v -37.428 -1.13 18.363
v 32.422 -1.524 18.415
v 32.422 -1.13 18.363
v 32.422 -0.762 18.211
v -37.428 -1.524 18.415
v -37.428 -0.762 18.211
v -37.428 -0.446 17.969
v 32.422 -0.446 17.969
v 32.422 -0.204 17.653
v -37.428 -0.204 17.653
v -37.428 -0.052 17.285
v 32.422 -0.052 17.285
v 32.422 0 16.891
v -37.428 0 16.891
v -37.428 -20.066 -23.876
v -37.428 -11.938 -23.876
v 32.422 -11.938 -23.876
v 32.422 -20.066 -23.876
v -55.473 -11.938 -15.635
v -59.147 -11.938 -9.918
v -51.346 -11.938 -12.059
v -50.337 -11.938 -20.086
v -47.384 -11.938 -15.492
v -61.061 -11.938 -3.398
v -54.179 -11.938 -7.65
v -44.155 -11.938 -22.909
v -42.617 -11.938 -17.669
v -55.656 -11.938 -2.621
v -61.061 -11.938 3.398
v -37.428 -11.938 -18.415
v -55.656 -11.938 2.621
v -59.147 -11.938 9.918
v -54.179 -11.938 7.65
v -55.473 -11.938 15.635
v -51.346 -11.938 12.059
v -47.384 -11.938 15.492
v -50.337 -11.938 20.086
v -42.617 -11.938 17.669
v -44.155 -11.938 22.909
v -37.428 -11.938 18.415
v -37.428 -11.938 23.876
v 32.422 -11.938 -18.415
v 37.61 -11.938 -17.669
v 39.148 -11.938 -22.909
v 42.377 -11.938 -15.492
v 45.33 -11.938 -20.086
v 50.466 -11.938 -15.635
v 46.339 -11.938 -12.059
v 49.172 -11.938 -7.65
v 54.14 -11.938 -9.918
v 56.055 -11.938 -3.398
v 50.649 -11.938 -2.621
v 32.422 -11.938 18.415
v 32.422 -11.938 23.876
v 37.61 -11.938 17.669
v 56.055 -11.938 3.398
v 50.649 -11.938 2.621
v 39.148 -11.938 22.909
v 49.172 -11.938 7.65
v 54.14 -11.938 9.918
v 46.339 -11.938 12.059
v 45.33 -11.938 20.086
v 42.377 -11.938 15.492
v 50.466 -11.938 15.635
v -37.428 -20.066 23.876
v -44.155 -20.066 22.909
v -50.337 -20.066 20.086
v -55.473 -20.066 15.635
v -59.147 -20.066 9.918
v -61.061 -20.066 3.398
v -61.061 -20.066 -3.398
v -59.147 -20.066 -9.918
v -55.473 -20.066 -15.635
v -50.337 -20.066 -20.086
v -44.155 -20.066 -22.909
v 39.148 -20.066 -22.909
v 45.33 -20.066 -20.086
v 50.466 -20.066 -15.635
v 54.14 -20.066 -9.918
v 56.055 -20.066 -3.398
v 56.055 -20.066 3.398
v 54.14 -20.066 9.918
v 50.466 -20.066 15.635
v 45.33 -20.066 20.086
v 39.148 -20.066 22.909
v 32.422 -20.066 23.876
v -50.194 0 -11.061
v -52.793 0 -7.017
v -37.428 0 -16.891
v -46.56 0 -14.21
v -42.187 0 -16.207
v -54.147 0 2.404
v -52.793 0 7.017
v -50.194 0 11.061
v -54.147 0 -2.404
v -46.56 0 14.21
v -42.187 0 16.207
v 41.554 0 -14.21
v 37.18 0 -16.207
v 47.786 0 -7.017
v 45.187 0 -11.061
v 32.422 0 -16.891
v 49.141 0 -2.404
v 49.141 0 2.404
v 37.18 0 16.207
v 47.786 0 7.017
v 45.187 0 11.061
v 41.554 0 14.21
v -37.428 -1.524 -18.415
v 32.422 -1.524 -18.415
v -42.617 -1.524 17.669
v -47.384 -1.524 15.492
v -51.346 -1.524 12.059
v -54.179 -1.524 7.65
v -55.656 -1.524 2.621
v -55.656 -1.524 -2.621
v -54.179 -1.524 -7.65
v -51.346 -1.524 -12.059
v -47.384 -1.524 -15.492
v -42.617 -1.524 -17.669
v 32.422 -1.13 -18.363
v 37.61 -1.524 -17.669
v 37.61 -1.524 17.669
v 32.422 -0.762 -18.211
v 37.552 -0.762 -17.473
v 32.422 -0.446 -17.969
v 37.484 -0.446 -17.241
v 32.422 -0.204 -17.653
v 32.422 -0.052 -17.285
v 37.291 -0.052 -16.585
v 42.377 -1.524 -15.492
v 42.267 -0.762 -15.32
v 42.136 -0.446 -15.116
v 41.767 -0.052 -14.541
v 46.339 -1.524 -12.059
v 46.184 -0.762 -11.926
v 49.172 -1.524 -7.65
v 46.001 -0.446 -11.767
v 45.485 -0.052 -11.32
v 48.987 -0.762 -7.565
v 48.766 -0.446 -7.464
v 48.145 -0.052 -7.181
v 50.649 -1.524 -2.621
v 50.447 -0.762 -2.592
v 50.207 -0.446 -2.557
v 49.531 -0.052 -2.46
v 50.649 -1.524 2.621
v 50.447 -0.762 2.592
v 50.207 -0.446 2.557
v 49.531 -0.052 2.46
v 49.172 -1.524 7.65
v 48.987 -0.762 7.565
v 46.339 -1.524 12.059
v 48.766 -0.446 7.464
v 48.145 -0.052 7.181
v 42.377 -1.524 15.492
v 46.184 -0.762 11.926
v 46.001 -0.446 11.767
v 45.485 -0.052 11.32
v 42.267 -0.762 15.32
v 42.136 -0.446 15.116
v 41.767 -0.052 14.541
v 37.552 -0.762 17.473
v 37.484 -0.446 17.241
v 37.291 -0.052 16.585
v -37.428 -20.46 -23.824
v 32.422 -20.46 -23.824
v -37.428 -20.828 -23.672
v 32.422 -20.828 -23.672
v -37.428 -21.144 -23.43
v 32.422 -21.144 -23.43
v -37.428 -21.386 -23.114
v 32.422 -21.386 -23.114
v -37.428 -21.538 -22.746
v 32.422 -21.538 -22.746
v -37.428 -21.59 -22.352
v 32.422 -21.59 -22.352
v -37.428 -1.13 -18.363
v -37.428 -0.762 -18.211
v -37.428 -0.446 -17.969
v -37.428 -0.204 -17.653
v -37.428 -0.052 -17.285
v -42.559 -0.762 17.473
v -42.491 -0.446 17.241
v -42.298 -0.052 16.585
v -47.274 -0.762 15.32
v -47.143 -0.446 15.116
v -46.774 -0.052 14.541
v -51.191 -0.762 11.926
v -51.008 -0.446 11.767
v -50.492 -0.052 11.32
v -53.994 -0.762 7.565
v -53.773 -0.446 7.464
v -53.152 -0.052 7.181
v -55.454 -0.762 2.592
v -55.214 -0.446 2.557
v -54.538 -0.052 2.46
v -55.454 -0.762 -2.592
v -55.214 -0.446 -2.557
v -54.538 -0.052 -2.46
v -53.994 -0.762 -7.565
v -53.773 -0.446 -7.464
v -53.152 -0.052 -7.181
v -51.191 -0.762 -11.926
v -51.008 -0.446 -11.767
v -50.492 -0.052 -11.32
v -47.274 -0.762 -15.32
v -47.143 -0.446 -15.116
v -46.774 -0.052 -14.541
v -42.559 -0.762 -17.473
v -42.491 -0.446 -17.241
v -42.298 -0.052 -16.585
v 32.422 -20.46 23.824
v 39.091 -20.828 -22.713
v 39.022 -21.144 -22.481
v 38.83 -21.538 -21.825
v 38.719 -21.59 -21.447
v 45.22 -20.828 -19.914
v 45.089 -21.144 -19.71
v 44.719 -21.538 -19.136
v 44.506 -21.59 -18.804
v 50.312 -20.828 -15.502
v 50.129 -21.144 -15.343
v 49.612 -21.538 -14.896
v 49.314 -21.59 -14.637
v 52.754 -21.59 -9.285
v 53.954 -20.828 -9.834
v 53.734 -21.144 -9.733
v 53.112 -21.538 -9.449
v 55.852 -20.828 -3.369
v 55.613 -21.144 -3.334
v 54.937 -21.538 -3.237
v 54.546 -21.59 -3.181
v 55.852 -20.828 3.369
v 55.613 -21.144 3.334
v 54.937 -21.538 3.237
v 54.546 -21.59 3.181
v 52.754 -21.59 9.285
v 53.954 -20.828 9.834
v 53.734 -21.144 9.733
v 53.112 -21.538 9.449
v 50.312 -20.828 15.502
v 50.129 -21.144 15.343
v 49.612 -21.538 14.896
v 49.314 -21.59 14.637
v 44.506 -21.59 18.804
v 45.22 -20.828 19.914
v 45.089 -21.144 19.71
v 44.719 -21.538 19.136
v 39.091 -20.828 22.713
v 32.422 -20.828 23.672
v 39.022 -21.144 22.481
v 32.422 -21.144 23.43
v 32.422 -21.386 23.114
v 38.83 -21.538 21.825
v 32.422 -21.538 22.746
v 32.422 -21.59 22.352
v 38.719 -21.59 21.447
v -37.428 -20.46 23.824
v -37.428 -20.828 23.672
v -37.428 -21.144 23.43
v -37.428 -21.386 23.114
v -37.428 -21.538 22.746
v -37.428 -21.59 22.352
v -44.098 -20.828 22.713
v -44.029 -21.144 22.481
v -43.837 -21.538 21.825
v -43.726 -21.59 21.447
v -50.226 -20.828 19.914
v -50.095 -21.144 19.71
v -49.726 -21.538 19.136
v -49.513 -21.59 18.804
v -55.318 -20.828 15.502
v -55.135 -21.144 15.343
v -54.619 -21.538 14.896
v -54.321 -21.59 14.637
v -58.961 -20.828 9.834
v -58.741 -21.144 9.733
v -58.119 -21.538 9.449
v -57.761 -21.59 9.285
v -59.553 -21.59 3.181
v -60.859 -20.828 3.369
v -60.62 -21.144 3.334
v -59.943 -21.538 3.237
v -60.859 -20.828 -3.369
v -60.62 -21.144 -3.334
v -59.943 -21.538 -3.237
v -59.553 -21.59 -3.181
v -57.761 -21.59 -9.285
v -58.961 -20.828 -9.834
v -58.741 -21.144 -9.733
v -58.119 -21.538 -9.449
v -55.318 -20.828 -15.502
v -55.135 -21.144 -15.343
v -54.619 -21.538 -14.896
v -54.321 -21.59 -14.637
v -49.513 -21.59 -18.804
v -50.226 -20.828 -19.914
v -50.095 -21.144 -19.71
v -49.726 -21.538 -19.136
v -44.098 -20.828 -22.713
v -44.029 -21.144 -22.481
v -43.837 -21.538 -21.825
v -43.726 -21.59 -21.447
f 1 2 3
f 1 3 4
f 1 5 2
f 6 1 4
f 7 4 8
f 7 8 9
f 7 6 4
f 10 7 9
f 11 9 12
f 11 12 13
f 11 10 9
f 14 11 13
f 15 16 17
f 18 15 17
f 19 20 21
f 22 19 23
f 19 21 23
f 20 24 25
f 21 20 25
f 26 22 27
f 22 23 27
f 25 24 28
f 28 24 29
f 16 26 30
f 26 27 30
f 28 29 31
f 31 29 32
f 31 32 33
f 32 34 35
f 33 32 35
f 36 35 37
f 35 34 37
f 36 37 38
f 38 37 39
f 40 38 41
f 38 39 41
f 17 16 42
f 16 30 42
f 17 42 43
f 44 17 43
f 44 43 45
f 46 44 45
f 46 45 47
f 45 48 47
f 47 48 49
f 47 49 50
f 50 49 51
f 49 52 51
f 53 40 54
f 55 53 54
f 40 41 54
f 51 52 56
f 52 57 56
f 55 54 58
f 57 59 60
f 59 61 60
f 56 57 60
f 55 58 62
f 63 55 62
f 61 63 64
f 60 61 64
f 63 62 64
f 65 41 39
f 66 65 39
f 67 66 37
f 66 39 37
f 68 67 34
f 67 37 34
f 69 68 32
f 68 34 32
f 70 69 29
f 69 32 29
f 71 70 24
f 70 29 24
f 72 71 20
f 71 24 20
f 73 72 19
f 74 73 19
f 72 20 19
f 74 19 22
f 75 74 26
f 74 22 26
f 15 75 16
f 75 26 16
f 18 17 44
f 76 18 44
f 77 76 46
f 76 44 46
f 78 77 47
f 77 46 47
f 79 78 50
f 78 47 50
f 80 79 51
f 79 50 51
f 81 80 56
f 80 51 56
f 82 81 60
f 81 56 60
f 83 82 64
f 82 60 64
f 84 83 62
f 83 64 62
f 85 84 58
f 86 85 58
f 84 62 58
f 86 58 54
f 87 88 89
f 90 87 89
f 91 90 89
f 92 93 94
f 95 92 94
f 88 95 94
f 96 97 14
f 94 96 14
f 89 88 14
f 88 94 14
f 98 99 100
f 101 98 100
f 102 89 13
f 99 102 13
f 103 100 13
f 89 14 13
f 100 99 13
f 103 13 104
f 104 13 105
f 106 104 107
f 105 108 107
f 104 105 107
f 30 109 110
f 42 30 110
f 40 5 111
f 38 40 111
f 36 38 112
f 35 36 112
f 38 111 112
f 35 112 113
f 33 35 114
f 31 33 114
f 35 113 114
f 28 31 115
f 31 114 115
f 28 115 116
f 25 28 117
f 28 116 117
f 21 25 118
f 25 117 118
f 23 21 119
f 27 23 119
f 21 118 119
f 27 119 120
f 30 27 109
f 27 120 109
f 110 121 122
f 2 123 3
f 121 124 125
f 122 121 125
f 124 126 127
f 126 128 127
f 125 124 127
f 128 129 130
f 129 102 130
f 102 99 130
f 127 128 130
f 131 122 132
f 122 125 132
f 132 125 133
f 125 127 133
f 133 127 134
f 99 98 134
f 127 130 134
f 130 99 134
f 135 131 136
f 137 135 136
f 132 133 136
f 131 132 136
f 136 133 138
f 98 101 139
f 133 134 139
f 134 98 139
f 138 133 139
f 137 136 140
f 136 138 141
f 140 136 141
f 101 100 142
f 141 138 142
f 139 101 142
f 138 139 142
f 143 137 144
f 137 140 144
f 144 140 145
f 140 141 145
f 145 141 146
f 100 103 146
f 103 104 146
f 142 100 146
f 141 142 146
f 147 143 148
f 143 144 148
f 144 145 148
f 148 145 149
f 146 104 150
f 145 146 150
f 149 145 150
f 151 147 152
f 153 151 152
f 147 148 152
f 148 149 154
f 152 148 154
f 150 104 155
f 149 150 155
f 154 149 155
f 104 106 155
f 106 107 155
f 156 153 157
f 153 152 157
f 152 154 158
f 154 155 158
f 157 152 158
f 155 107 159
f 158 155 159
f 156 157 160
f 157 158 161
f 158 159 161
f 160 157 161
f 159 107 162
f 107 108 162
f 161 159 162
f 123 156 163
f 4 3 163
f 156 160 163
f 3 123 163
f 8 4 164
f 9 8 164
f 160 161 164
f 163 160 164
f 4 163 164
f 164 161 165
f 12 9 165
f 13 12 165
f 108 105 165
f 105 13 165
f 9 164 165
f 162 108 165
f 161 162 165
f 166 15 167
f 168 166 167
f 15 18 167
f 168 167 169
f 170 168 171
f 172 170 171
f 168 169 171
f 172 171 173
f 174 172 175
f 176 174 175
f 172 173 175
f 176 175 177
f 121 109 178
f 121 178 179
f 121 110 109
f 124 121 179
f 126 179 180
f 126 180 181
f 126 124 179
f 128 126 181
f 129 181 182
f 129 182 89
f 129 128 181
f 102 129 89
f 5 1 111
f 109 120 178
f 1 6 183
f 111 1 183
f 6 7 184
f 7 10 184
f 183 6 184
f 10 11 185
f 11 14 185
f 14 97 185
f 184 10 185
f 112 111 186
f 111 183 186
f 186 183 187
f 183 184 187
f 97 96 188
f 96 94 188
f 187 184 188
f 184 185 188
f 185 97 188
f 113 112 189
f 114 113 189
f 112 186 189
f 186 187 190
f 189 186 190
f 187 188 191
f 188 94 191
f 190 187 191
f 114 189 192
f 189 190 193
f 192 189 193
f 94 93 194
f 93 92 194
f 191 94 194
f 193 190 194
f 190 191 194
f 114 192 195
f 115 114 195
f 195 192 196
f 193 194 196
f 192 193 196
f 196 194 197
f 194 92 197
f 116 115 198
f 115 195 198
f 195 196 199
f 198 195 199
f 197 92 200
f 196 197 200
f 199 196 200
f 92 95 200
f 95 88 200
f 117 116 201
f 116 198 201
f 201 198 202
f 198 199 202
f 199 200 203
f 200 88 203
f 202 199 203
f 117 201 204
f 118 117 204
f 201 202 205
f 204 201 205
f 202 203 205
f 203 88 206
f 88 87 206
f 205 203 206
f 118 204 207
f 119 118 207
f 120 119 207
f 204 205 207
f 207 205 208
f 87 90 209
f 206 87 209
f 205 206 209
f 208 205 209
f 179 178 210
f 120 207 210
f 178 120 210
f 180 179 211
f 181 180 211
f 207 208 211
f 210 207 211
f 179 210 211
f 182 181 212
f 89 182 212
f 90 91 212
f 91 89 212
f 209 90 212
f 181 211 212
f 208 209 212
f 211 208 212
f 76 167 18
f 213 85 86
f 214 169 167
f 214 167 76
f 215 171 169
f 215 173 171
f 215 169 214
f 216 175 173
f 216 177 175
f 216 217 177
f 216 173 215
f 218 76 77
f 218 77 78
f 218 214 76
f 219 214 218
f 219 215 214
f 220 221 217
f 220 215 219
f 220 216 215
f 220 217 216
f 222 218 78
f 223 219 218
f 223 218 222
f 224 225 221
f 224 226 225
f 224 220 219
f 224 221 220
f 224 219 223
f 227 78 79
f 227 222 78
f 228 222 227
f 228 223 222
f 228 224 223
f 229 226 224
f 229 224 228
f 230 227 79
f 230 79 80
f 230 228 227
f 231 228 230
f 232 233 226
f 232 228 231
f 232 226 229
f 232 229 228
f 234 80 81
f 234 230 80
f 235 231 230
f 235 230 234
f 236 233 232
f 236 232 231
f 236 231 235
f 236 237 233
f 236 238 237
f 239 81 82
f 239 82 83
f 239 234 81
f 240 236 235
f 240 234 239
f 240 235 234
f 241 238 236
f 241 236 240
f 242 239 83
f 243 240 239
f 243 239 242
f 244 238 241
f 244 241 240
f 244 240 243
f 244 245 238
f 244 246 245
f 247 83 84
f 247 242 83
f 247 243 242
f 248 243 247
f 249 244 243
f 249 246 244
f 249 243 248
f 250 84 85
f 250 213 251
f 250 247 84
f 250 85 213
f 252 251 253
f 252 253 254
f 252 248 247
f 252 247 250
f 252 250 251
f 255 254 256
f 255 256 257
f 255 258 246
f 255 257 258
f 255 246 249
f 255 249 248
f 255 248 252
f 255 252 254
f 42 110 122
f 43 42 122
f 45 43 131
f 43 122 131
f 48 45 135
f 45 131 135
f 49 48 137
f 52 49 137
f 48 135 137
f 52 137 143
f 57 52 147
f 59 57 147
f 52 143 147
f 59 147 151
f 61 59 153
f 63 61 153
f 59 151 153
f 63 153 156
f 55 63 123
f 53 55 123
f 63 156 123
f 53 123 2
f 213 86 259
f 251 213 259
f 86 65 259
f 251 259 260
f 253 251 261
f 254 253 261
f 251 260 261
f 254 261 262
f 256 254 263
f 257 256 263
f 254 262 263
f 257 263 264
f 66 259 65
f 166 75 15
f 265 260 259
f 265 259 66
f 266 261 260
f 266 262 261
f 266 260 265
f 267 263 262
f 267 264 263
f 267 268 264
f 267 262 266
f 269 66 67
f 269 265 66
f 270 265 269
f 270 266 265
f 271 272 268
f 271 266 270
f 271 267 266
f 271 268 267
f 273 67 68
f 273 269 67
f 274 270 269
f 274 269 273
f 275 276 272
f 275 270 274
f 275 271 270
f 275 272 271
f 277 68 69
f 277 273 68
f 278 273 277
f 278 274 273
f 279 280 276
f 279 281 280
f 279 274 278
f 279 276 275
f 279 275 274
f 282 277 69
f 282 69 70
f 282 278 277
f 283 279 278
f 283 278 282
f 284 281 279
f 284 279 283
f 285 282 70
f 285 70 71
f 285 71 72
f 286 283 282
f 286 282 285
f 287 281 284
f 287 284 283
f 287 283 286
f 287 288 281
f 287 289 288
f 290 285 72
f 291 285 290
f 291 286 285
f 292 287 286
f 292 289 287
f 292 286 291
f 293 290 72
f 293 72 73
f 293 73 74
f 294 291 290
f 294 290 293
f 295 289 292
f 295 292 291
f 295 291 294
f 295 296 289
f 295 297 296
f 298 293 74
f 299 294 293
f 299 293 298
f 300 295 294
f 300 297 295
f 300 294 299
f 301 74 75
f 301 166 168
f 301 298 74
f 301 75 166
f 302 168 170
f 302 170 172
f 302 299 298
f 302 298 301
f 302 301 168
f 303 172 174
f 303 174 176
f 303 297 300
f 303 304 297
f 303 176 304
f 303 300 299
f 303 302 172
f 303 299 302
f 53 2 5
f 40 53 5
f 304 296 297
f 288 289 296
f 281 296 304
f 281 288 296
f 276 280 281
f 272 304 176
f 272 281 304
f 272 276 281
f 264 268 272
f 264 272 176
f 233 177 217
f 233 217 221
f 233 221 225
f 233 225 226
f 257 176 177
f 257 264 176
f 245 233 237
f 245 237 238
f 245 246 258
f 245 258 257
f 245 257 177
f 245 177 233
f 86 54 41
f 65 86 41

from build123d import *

# Parameters (mm, degrees)
F1_DEPTH = 11.938
F3_DEPTH = 9.652
F4_R     = 1.524


with BuildPart() as f1:
    # F0 (on Front) → F1 (new body)
    with BuildSketch(Plane.XZ):
        with BuildLine():
            Line((32.421591, 18.415), (-37.428409, 18.415))
            ThreePointArc((-37.428409, 18.415), (-55.843409, 0), (-37.428409, -18.415))
            Line((-37.428409, -18.415), (32.421591, -18.415))
            ThreePointArc((32.421591, -18.415), (50.836591, 0), (32.421591, 18.415))
        make_face()
    extrude(amount=F1_DEPTH)

    # F2 (on face) → F3 (join)
    with BuildSketch(Plane.XZ.offset(11.938)):
        with BuildLine():
            Line((32.421591, 23.876), (-37.428409, 23.876))
            ThreePointArc((-37.428409, 23.876), (-61.304409, 0), (-37.428409, -23.876))
            Line((-37.428409, -23.876), (32.421591, -23.876))
            ThreePointArc((32.421591, -23.876), (56.297591, 0), (32.421591, 23.876))
        make_face()
    extrude(amount=F3_DEPTH)

    # F4
    f4_edges = [f1.edges().sort_by_distance(p)[0] for p in [
        (-2.503409, -21.59, 23.876),
        (-61.304409, -21.59, 0),
        (-2.503409, -21.59, -23.876),
        (56.297591, -21.59, 0),
        (-2.503409, 0, 18.415),
        (-55.843409, 0, 0),
        (-2.503409, 0, -18.415),
        (50.836591, 0, 0),
    ]]
    fillet(f4_edges, radius=F4_R)


solid = f1.part
